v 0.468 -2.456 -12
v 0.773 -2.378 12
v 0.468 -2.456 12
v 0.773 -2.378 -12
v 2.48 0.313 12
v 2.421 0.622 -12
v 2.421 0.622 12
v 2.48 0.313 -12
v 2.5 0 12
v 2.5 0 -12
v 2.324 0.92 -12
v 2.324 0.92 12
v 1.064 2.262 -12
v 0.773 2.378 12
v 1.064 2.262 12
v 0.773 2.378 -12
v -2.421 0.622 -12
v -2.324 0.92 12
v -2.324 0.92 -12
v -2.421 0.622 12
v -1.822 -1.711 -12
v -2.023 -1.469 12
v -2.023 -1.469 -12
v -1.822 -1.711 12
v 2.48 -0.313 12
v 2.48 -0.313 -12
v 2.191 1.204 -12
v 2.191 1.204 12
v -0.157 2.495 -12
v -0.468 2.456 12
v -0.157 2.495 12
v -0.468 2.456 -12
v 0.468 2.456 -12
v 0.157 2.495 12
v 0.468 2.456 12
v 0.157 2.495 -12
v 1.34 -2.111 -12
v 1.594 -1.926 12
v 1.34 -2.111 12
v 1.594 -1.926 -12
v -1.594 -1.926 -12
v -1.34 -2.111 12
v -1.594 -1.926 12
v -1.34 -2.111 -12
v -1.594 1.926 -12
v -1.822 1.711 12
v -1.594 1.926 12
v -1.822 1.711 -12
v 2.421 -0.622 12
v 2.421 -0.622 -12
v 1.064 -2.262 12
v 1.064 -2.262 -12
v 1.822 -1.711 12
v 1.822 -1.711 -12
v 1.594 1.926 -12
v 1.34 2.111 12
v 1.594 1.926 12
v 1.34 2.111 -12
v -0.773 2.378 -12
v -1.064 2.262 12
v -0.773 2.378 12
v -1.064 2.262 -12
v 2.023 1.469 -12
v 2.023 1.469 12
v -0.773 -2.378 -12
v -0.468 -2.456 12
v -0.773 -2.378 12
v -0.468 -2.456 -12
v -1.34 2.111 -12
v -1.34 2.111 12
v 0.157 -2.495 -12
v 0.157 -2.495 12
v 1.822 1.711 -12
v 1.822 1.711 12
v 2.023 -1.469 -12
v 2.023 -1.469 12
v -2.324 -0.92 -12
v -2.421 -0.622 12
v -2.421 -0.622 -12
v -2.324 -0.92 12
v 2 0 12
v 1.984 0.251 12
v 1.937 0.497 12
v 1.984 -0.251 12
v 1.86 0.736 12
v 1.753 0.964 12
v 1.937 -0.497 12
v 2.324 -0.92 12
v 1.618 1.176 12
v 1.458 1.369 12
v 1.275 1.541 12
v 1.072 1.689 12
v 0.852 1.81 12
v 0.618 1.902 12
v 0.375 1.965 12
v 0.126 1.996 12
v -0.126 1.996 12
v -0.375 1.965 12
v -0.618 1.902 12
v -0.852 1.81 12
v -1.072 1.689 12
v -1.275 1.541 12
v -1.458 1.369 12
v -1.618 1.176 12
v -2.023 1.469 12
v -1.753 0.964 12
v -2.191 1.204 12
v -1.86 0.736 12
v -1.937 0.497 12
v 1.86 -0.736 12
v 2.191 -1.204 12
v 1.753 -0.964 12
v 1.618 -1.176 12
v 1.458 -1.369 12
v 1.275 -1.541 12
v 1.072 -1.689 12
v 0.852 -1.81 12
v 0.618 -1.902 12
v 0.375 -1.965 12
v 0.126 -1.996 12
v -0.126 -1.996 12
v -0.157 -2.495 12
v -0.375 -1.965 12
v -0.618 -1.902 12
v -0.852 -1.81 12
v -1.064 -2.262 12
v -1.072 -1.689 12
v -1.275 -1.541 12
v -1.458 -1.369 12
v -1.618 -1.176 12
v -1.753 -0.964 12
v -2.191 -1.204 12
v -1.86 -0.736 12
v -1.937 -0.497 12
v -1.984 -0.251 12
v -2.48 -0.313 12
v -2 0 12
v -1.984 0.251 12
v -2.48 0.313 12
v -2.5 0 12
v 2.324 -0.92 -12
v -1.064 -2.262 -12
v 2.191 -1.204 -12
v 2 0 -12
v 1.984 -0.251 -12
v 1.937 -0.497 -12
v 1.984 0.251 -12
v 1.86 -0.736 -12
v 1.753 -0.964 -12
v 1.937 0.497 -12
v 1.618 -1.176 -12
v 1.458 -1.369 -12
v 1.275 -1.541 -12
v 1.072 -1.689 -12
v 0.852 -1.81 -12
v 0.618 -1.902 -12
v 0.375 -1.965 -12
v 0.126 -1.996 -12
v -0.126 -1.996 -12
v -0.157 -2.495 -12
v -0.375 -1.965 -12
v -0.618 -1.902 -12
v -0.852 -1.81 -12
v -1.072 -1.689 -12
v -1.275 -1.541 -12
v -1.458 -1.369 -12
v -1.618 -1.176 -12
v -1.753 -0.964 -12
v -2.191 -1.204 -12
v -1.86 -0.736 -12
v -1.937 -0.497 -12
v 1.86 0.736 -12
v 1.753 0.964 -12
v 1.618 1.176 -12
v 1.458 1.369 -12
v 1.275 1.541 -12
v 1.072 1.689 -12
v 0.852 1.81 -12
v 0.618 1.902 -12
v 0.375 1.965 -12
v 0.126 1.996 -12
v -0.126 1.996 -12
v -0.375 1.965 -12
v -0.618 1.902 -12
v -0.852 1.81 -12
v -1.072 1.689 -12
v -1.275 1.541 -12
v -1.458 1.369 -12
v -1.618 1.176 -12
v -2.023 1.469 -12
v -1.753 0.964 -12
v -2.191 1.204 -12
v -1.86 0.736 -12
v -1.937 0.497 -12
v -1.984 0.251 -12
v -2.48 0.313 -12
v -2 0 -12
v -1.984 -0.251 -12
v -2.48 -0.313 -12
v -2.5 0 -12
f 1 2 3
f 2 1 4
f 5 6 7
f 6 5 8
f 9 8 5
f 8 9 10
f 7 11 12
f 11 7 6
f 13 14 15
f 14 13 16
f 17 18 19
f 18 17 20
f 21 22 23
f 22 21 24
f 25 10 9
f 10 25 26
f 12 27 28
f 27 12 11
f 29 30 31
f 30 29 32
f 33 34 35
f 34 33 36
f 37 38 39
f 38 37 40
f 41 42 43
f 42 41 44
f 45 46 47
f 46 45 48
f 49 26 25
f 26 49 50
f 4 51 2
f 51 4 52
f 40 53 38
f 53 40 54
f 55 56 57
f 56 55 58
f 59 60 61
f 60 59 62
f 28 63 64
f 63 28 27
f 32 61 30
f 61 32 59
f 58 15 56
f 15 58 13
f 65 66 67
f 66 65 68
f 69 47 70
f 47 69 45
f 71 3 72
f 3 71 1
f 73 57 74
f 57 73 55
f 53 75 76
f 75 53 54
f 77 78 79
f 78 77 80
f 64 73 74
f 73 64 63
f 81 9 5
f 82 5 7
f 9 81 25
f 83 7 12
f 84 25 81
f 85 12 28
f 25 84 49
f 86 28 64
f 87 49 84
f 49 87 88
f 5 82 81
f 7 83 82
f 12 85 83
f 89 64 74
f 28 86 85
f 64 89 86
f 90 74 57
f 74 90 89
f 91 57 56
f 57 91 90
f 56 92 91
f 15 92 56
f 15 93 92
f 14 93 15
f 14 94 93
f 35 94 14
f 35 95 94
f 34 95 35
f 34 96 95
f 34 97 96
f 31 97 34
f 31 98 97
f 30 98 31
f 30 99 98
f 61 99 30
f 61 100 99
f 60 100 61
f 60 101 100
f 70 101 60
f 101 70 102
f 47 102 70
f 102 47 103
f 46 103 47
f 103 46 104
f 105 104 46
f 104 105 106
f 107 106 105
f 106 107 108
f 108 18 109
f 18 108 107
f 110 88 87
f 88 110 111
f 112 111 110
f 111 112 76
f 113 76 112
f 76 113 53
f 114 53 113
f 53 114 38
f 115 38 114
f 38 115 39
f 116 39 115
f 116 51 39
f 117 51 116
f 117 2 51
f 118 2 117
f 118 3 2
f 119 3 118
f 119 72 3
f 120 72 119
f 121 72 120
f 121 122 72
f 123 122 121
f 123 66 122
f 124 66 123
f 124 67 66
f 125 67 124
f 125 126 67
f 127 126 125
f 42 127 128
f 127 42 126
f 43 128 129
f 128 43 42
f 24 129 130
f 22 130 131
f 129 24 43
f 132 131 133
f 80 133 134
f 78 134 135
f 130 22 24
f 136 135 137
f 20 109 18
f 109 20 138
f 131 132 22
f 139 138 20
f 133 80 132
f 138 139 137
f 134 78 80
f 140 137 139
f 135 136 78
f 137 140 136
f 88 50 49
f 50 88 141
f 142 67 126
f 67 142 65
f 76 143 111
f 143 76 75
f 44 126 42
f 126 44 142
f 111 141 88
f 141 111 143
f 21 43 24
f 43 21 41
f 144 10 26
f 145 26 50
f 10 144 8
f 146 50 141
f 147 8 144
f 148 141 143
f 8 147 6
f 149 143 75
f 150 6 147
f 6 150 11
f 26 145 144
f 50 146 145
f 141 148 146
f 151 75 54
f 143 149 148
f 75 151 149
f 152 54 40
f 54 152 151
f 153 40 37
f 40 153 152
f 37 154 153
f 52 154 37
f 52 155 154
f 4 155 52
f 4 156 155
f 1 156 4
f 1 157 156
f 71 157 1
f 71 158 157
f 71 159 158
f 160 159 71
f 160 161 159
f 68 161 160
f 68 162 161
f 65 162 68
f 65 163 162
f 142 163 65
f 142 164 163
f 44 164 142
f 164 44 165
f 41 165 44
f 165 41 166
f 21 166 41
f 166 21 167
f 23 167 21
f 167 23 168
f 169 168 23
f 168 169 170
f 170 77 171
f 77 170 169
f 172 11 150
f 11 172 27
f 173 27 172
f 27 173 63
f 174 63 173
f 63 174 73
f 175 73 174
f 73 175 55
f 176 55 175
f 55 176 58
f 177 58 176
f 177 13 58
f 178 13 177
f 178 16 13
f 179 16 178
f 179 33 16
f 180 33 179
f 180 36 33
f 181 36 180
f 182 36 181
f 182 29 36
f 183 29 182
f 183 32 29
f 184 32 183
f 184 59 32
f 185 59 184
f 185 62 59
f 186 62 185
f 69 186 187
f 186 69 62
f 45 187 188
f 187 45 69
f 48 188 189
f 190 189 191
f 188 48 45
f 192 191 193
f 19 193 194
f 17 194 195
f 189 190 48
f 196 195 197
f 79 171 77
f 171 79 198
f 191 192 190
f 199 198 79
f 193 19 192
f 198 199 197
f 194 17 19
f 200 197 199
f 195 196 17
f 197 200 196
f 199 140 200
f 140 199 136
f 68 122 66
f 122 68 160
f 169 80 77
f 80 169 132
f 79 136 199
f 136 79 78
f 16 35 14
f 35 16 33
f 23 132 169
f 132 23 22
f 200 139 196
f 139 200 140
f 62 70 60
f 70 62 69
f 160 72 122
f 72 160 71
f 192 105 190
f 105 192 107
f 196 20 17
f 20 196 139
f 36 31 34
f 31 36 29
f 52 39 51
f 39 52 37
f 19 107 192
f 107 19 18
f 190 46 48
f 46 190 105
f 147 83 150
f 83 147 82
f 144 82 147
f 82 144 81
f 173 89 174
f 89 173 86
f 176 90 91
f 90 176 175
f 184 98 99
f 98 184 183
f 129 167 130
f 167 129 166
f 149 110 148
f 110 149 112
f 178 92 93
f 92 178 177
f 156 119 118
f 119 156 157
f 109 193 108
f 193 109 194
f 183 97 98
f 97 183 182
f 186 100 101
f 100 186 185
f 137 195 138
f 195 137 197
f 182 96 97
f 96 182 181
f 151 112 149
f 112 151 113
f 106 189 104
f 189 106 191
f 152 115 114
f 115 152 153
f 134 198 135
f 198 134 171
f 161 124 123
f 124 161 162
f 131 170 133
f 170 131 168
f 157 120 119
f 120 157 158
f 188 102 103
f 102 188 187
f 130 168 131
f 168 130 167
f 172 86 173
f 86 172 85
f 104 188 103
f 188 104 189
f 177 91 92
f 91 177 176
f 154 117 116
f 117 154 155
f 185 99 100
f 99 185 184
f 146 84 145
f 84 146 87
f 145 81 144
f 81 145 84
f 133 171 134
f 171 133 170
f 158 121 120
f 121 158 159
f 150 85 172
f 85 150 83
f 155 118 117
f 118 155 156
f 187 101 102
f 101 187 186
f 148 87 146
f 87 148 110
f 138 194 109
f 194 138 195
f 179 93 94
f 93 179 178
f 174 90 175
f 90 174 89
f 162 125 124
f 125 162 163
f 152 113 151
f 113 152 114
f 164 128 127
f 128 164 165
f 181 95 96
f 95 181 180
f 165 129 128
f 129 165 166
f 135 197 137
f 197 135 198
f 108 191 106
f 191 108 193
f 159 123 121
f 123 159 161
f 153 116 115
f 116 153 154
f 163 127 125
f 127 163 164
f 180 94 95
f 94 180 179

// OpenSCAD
$fn = 50;


difference() {
	union() {
		translate(v = [0, 0, -12.0000000000]) {
			cylinder(h = 24, r = 2.5000000000);
		}
	}
	union() {
		translate(v = [0, 0, -100.0000000000]) {
			cylinder(h = 200, r = 2.0000000000);
		}
	}
}
